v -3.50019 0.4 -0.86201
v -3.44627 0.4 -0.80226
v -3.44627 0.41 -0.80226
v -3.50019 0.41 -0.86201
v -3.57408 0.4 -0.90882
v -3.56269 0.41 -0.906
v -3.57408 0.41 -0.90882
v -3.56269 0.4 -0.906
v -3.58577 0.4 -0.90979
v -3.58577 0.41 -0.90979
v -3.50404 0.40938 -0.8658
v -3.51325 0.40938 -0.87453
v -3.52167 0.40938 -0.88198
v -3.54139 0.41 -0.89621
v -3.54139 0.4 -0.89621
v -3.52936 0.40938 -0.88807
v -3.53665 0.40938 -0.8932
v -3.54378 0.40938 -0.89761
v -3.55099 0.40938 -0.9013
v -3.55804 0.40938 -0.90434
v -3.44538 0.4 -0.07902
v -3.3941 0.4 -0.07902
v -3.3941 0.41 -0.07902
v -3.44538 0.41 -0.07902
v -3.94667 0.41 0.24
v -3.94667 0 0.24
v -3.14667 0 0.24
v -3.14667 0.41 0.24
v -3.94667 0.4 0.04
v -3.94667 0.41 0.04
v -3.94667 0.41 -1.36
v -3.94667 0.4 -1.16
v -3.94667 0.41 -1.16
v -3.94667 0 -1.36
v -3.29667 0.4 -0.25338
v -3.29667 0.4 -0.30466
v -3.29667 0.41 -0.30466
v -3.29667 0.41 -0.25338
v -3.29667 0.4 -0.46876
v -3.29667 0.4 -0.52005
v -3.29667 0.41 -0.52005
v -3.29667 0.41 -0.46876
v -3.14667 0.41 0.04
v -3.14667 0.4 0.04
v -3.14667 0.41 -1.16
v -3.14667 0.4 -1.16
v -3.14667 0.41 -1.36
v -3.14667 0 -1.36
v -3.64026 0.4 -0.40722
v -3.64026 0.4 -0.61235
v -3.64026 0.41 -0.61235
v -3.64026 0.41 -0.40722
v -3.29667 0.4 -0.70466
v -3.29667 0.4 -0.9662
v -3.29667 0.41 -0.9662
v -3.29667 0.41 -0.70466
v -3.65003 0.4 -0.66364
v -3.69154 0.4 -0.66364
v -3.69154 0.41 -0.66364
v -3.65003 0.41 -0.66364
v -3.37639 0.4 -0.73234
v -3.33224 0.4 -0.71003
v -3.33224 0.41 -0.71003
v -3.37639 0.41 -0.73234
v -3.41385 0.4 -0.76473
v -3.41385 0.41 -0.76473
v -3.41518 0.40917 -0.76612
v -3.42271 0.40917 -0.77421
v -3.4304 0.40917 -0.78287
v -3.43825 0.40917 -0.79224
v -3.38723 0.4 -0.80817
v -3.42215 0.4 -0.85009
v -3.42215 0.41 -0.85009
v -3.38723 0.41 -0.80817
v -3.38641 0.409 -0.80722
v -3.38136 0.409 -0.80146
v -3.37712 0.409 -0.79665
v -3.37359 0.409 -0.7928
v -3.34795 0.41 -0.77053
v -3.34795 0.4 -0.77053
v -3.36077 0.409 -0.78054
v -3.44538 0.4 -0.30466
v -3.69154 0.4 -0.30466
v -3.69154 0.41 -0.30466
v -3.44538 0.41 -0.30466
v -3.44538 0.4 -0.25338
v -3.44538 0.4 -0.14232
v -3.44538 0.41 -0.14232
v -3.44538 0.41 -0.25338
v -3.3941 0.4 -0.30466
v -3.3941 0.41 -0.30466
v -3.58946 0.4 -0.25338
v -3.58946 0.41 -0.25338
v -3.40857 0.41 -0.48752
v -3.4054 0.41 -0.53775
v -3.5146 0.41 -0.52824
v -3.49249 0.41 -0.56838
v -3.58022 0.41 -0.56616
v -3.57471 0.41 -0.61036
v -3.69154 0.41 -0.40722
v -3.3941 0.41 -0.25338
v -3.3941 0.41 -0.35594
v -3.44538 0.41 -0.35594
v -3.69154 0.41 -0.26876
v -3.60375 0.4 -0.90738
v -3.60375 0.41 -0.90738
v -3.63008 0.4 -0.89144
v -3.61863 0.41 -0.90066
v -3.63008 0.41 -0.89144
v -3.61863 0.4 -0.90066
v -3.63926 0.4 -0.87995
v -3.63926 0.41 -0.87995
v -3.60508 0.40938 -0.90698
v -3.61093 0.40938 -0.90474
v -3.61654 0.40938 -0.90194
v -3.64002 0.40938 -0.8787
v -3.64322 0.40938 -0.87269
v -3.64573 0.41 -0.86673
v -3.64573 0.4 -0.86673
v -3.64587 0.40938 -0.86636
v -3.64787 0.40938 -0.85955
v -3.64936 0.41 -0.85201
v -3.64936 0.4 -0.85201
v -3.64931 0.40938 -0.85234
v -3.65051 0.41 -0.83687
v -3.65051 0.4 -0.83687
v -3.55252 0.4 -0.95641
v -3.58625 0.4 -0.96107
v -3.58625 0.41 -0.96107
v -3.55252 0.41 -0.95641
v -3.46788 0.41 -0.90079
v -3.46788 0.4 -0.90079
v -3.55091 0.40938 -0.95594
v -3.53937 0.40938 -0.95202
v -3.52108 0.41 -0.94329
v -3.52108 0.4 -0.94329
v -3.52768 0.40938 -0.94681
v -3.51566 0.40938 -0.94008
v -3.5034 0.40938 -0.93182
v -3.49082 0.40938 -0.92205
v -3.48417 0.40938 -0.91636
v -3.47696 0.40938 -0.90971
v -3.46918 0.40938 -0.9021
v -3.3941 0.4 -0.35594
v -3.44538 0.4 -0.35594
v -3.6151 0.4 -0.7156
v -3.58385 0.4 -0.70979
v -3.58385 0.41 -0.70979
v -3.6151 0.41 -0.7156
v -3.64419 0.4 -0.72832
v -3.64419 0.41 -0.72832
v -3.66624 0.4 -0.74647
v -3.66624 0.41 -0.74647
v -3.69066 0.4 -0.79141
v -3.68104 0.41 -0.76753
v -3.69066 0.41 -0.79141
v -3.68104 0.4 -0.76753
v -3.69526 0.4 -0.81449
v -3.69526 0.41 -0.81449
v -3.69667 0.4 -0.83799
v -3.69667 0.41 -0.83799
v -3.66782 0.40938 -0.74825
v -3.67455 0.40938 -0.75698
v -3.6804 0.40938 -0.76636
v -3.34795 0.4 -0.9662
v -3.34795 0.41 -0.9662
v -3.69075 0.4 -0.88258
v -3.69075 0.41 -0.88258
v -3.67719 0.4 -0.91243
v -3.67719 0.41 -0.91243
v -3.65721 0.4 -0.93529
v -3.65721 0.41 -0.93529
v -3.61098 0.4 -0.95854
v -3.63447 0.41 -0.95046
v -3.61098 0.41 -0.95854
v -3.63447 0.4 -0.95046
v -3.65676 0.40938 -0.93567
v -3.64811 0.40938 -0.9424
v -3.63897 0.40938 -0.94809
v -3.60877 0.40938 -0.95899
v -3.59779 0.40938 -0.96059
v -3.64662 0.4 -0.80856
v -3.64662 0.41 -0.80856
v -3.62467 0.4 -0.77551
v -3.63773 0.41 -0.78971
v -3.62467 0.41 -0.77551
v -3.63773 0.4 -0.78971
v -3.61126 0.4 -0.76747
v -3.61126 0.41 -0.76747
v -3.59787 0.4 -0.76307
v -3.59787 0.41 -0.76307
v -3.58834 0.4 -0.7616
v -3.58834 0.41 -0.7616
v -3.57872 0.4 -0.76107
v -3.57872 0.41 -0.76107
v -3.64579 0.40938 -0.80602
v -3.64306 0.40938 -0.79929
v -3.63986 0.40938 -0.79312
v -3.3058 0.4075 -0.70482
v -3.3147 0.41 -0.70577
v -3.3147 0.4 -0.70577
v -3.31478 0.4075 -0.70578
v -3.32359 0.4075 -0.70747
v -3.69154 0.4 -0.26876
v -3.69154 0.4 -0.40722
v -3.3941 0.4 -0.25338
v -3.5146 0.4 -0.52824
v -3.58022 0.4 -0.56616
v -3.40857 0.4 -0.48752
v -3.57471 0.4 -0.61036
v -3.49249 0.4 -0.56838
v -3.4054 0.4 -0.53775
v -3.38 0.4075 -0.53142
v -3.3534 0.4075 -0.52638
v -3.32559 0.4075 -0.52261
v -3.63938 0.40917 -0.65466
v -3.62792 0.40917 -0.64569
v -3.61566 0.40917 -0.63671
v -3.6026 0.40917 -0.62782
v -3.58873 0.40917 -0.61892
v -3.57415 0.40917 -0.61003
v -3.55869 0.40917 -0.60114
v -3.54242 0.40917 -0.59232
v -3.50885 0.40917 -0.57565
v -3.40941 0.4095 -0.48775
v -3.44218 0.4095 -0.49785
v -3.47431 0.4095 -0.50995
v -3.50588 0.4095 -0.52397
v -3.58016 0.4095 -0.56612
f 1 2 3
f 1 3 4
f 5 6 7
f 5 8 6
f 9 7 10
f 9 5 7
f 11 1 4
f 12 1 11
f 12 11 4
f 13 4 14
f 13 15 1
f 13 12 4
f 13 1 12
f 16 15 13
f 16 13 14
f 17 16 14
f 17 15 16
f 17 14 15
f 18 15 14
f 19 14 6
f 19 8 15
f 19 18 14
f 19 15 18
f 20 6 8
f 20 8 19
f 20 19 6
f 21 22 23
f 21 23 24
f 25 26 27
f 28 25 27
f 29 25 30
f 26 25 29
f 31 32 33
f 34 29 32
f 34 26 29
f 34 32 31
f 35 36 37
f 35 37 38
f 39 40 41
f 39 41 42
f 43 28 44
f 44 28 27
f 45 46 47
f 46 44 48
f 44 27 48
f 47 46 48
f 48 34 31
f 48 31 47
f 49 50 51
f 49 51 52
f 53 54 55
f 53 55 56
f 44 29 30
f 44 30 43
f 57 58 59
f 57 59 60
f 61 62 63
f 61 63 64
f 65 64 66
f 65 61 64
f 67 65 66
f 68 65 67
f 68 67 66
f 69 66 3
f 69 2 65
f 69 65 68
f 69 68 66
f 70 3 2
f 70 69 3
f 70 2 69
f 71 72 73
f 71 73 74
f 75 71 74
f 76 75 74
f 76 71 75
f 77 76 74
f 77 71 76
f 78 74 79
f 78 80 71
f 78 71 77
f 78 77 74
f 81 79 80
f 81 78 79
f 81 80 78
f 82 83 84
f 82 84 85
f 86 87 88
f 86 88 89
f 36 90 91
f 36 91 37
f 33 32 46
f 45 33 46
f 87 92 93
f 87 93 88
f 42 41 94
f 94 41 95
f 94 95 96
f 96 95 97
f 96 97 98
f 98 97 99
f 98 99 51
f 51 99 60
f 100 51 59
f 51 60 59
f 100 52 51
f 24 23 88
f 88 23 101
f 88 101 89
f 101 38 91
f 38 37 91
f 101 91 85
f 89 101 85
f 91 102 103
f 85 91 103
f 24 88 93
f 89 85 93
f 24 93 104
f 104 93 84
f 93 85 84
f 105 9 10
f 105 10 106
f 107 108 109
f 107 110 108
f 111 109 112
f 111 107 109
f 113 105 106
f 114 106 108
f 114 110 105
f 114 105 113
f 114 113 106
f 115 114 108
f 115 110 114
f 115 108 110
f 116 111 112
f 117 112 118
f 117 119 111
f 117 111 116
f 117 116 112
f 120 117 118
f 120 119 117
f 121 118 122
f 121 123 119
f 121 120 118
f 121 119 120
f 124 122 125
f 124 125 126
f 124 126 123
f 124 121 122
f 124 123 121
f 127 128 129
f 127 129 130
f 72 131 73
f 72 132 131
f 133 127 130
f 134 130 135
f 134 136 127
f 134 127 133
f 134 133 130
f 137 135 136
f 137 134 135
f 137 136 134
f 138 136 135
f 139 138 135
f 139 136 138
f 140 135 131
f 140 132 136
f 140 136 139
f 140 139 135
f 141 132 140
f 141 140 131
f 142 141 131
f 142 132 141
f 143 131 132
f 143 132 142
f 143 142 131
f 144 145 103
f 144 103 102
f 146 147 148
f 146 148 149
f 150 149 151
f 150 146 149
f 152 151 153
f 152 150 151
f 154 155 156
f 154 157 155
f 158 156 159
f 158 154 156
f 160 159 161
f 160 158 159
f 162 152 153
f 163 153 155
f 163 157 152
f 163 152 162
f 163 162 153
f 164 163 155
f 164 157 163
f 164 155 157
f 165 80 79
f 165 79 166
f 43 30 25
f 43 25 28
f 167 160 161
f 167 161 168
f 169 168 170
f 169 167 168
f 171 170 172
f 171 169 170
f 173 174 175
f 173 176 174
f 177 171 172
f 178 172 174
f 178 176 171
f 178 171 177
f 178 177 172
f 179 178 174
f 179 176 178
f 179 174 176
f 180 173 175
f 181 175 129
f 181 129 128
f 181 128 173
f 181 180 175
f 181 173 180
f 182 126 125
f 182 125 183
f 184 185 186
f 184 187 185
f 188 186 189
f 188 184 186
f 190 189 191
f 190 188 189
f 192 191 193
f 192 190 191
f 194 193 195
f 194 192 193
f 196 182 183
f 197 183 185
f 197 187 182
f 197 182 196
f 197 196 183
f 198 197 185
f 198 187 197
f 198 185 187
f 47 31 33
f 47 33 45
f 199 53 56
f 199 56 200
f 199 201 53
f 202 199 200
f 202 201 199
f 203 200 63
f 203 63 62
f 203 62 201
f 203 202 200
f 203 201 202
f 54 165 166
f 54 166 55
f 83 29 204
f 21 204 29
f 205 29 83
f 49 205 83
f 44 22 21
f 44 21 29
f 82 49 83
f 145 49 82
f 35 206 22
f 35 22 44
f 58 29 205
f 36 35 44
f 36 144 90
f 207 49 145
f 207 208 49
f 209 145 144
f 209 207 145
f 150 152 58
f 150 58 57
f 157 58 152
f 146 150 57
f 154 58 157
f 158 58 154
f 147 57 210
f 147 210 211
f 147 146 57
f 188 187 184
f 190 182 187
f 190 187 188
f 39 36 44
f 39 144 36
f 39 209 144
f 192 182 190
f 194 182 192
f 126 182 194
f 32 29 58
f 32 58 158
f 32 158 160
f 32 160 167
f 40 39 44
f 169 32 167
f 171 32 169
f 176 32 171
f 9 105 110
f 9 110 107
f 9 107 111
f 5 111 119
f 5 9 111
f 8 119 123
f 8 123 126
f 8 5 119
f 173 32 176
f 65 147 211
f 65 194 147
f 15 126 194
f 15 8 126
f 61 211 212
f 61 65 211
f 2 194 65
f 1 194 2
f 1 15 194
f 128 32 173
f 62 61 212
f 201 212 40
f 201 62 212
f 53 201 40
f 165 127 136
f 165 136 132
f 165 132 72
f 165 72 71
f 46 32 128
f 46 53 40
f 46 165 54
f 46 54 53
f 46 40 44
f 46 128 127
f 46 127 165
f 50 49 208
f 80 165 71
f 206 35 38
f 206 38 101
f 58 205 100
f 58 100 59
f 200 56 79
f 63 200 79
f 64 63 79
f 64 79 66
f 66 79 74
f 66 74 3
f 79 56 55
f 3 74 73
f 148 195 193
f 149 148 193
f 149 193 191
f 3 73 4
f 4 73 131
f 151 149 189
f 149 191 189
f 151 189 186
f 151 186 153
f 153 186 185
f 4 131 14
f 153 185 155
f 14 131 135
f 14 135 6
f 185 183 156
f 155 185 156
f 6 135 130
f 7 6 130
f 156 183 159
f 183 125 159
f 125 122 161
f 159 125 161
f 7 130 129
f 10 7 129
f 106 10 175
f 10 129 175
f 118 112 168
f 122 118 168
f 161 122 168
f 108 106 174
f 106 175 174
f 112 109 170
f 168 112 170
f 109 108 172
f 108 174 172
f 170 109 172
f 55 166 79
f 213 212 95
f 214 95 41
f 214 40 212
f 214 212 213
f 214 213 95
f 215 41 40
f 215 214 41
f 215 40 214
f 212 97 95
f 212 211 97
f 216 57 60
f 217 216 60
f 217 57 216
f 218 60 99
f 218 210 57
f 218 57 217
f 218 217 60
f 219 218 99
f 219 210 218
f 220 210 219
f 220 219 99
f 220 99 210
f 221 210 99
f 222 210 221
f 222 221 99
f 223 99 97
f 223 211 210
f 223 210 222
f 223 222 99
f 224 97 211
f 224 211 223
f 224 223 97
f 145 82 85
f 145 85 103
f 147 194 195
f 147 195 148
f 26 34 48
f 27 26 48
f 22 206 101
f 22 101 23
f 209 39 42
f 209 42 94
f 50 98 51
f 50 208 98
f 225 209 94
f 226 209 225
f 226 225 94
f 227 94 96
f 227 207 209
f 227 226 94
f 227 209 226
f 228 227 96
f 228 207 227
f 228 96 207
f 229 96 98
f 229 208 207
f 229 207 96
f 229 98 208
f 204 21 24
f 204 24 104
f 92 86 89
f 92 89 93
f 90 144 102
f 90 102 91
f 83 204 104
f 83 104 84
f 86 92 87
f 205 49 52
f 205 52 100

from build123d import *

# Parameters (mm, degrees)
SKETCH_1_W      = 0.8
SKETCH_1_H      = 1.6
EXTRUDE_1_DEPTH = 0.4
SKETCH_2_W      = 0.8
SKETCH_2_H      = 0.2
EXTRUDE_2_DEPTH = 0.01


with BuildPart() as part:
    # Эскиз1 → Бобышка-Вытянуть1 (new body)
    with BuildSketch(Plane(origin=(0, 0, 0), x_dir=(1, 0, 0), z_dir=(0, 1, 0))):
        with Locations((-3.546666667, 0.56)):
            Rectangle(SKETCH_1_W, SKETCH_1_H)
    extrude(amount=EXTRUDE_1_DEPTH)

    # Эскиз2 → Бобышка-Вытянуть2 (add)
    with BuildSketch(Plane(origin=(0, 0.4, 0), x_dir=(1, 0, 0), z_dir=(0, 1, 0))):
        with Locations((-3.546666667, 1.26)):
            Rectangle(SKETCH_2_W, SKETCH_2_H)
        with Locations((-3.546666667, -0.14)):
            Rectangle(SKETCH_2_W, SKETCH_2_H)
        with BuildLine():
            Line((-3.347948718, 0.96619925), (-3.296666667, 0.96619925))
            Line((-3.296666667, 0.96619925), (-3.296666667, 0.704660789))
            add(Edge.make_bspline(
                [(-3.296666667, 0.704660789), (-3.299714721, 0.704653678), (-3.305774032, 0.704639541), (-3.314770725, 0.705690594), (-3.323656392, 0.707274517), (-3.329375637, 0.709109309), (-3.33224359, 0.710029379)],
                knots=[0, 0, 0, 0, 1.010600758, 2.009000657, 3.001600101, 4, 4, 4, 4], degree=3))
            add(Edge.make_bspline(
                [(-3.33224359, 0.710029379), (-3.336932362, 0.711721718), (-3.346456969, 0.715159476), (-3.360187488, 0.722229591), (-3.373915942, 0.730387016), (-3.38506487, 0.738436812), (-3.393967559, 0.745776399), (-3.400931315, 0.751934453), (-3.408059998, 0.758757865), (-3.415351725, 0.766242173), (-3.422853891, 0.774315053), (-3.430591465, 0.782987605), (-3.438420265, 0.792362213), (-3.443609519, 0.798906673), (-3.446266026, 0.802256943)],
                knots=[0, 0, 0, 0, 1.204682444, 2.447149603, 3.728063212, 5.065745198, 5.768097617, 6.518745349, 7.313897871, 8.154576377, 9.046034033, 9.979646649, 10.965731253, 12, 12, 12, 12], degree=3))
            add(Edge.make_bspline(
                [(-3.446266026, 0.802256943), (-3.45059804, 0.807403785), (-3.458939607, 0.817314355), (-3.471317716, 0.831309641), (-3.482811507, 0.84409203), (-3.493622362, 0.855458095), (-3.503645651, 0.865500412), (-3.512857936, 0.874243792), (-3.521232754, 0.881759597), (-3.529066081, 0.887968052), (-3.536461335, 0.89316514), (-3.543635002, 0.897677348), (-3.550838276, 0.901299603), (-3.55793436, 0.904408042), (-3.564951278, 0.906819597), (-3.571951879, 0.908516787), (-3.578869895, 0.909613508), (-3.583495036, 0.909731149), (-3.585769231, 0.909788994)],
                knots=[0, 0, 0, 0, 1.782511555, 3.432339066, 4.950556168, 6.337242158, 7.588364383, 8.709771971, 9.70247892, 10.569050646, 11.3564271, 12.096888545, 12.812232926, 13.490631961, 14.148641375, 14.7751826, 15.397753892, 16, 16, 16, 16], degree=3))
            add(Edge.make_bspline(
                [(-3.585769231, 0.909788994), (-3.588017262, 0.909733321), (-3.592427777, 0.909624092), (-3.598882449, 0.908587524), (-3.605098798, 0.907145011), (-3.610963294, 0.904811094), (-3.616655693, 0.902039253), (-3.621990535, 0.898447859), (-3.627169376, 0.894382659), (-3.631921404, 0.889633661), (-3.636373741, 0.884482269), (-3.640098955, 0.87875047), (-3.643320365, 0.872720515), (-3.646025422, 0.866331302), (-3.647986405, 0.859488111), (-3.649417628, 0.852277685), (-3.650323049, 0.844694102), (-3.650448604, 0.839519116), (-3.650512821, 0.836872327)],
                knots=[0, 0, 0, 0, 0.987973548, 1.938350371, 2.870100611, 3.788647624, 4.708095761, 5.649791829, 6.611214459, 7.599816467, 8.600146238, 9.60047601, 10.599079585, 11.604913276, 12.645813302, 13.724097821, 14.835971573, 16, 16, 16, 16], degree=3))
            add(Edge.make_bspline(
                [(-3.650512821, 0.836872327), (-3.650448919, 0.83409195), (-3.65032386, 0.828650546), (-3.649414862, 0.820696253), (-3.648022672, 0.8131466), (-3.645906086, 0.806012387), (-3.643203711, 0.799339736), (-3.639949776, 0.793050051), (-3.636123517, 0.787190009), (-3.631628174, 0.781842581), (-3.626633448, 0.777010688), (-3.621196547, 0.772724047), (-3.615197435, 0.769184165), (-3.608751543, 0.766323888), (-3.601899236, 0.763966526), (-3.594572456, 0.762276504), (-3.586780767, 0.761351474), (-3.581444563, 0.761165878), (-3.578717949, 0.761071045)],
                knots=[0, 0, 0, 0, 1.130801575, 2.213061782, 3.252933619, 4.249917472, 5.234510032, 6.17726912, 7.126517163, 8.075267631, 9.012689889, 9.949419277, 10.884824487, 11.837981854, 12.813782694, 13.828488442, 14.890433304, 16, 16, 16, 16], degree=3))
            Line((-3.578717949, 0.761071045), (-3.583846154, 0.709788994))
            add(Edge.make_bspline(
                [(-3.583846154, 0.709788994), (-3.588315516, 0.710313674), (-3.597010277, 0.711334394), (-3.609603065, 0.71387702), (-3.621318367, 0.717446081), (-3.632317675, 0.721718641), (-3.642420269, 0.727067939), (-3.6518288, 0.733149711), (-3.660309503, 0.740238528), (-3.66800975, 0.74812715), (-3.674692755, 0.756896835), (-3.680625157, 0.766339148), (-3.685570315, 0.776564159), (-3.689671345, 0.787474273), (-3.692781161, 0.799101959), (-3.695011662, 0.811428697), (-3.696386448, 0.824474892), (-3.696571928, 0.833423413), (-3.696666667, 0.837994122)],
                knots=[0, 0, 0, 0, 1.130730993, 2.199739822, 3.223355253, 4.205635214, 5.160465258, 6.091399258, 7.016214058, 7.932437584, 8.856204186, 9.781944312, 10.73064304, 11.705670886, 12.707145581, 13.751268262, 14.851396981, 16, 16, 16, 16], degree=3))
            add(Edge.make_bspline(
                [(-3.696666667, 0.837994122), (-3.696587462, 0.842619542), (-3.69643317, 0.851629887), (-3.694854453, 0.864759408), (-3.692395617, 0.877147474), (-3.688968751, 0.888839497), (-3.684475113, 0.89976641), (-3.678984885, 0.909936577), (-3.672551696, 0.919397044), (-3.66509805, 0.927989176), (-3.656961938, 0.935738546), (-3.648276111, 0.94252391), (-3.639070222, 0.948230333), (-3.629462356, 0.952997663), (-3.619322428, 0.956642507), (-3.608726584, 0.959140325), (-3.597657153, 0.96085828), (-3.590102935, 0.960999181), (-3.58625, 0.961071045)],
                knots=[0, 0, 0, 0, 1.195413282, 2.328672114, 3.413490698, 4.457927086, 5.473612634, 6.462365753, 7.441157041, 8.42539015, 9.397434444, 10.3422866, 11.269742116, 12.193178192, 13.110630063, 14.048592791, 15.004708964, 16, 16, 16, 16], degree=3))
            add(Edge.make_bspline(
                [(-3.58625, 0.961071045), (-3.582291584, 0.96096106), (-3.574366015, 0.960740846), (-3.562521371, 0.959013923), (-3.550822762, 0.956087583), (-3.539112888, 0.952123006), (-3.527293622, 0.946848171), (-3.51526789, 0.940068453), (-3.502985529, 0.931735692), (-3.492609351, 0.923636931), (-3.483861017, 0.916172703), (-3.476660227, 0.909501035), (-3.46892387, 0.901874967), (-3.460562632, 0.893403332), (-3.451769433, 0.883875186), (-3.442303631, 0.873514434), (-3.432403514, 0.862105379), (-3.425640701, 0.854184786), (-3.422147436, 0.850093481)],
                knots=[0, 0, 0, 0, 0.927158598, 1.856363277, 2.797335015, 3.749167701, 4.749227661, 5.825023649, 6.979171586, 8.223362362, 8.906844726, 9.672958766, 10.52256342, 11.451810239, 12.461281865, 13.559912207, 14.739596516, 16, 16, 16, 16], degree=3))
            add(Edge.make_bspline(
                [(-3.422147436, 0.850093481), (-3.4193034, 0.84658306), (-3.413869486, 0.839875929), (-3.405878123, 0.830460357), (-3.398751822, 0.821860159), (-3.392389028, 0.814181288), (-3.386661568, 0.807485977), (-3.381635635, 0.801770745), (-3.377396759, 0.79693144), (-3.370792529, 0.789705237), (-3.361369328, 0.780582945), (-3.352291495, 0.773780445), (-3.347948718, 0.770526173)],
                knots=[0, 0, 0, 0, 1.242067915, 2.373138023, 3.395138797, 4.312776638, 5.114836229, 5.81737152, 6.405241861, 6.883397567, 8.50903741, 10, 10, 10, 10], degree=3))
            Line((-3.347948718, 0.770526173), (-3.347948718, 0.96619925))
        make_face()
        with BuildLine():
            Line((-3.64025641, 0.407224891), (-3.691538462, 0.407224891))
            Line((-3.691538462, 0.407224891), (-3.691538462, 0.663635148))
            Line((-3.691538462, 0.663635148), (-3.650032051, 0.663635148))
            add(Edge.make_bspline(
                [(-3.650032051, 0.663635148), (-3.646502021, 0.660616545), (-3.639284349, 0.654444563), (-3.627787933, 0.645502899), (-3.61554742, 0.636515998), (-3.60244882, 0.627635735), (-3.588592227, 0.61876604), (-3.573973239, 0.609833167), (-3.558531576, 0.600959048), (-3.536884197, 0.589255431), (-3.509140266, 0.575362882), (-3.475000597, 0.560856757), (-3.440531826, 0.54800689), (-3.417091589, 0.54116578), (-3.405400641, 0.537753738)],
                knots=[0, 0, 0, 0, 0.6032745, 1.233484441, 1.891357215, 2.57557336, 3.288734553, 4.028369461, 4.800843345, 5.601920993, 7.224937043, 8.829018402, 10.418455404, 12, 12, 12, 12], degree=3))
            add(Edge.make_bspline(
                [(-3.405400641, 0.537753738), (-3.396957321, 0.535541077), (-3.379780473, 0.531039703), (-3.353107004, 0.526112085), (-3.325295894, 0.522302305), (-3.306318462, 0.520806275), (-3.296666667, 0.520045404)],
                knots=[0, 0, 0, 0, 0.948866074, 1.930345965, 2.947387709, 4, 4, 4, 4], degree=3))
            Line((-3.296666667, 0.520045404), (-3.296666667, 0.468763353))
            add(Edge.make_bspline(
                [(-3.296666667, 0.468763353), (-3.300648464, 0.468886356), (-3.308836796, 0.469139305), (-3.321419039, 0.470257863), (-3.334626523, 0.471747682), (-3.34841463, 0.473851923), (-3.362811345, 0.47652659), (-3.377831929, 0.479713791), (-3.393445276, 0.483520299), (-3.415092317, 0.48914961), (-3.442310543, 0.497512223), (-3.474498855, 0.509677325), (-3.506137168, 0.52371432), (-3.531836702, 0.536987949), (-3.551768129, 0.548460586), (-3.566250592, 0.557079737), (-3.580059398, 0.565975659), (-3.593287523, 0.574947686), (-3.605942611, 0.584003547), (-3.617907266, 0.593326123), (-3.629421628, 0.60264096), (-3.636676667, 0.609144268), (-3.64025641, 0.612353097)],
                knots=[0, 0, 0, 0, 0.630310263, 1.296195935, 1.998233977, 2.733510572, 3.502865957, 4.315300234, 5.16313825, 6.045860881, 7.854817038, 9.665969389, 11.488229695, 13.329548187, 14.240214963, 15.127489952, 15.996309606, 16.839233987, 17.656863512, 18.458360632, 19.239332369, 20, 20, 20, 20], degree=3))
            Line((-3.64025641, 0.612353097), (-3.64025641, 0.407224891))
        make_face()
        Polygon((-3.296666667, 0.253378738), (-3.394102564, 0.253378738), (-3.394102564, 0.079019763), (-3.445384615, 0.079019763), (-3.691538462, 0.268763353), (-3.691538462, 0.304660789), (-3.445384615, 0.304660789), (-3.445384615, 0.35594284), (-3.394102564, 0.35594284), (-3.394102564, 0.304660789), (-3.296666667, 0.304660789), align=None)
        Polygon((-3.445384615, 0.253378738), (-3.589455128, 0.253378738), (-3.445384615, 0.142321045), align=None, mode=Mode.SUBTRACT)
    extrude(amount=EXTRUDE_2_DEPTH)


solid = part.part
